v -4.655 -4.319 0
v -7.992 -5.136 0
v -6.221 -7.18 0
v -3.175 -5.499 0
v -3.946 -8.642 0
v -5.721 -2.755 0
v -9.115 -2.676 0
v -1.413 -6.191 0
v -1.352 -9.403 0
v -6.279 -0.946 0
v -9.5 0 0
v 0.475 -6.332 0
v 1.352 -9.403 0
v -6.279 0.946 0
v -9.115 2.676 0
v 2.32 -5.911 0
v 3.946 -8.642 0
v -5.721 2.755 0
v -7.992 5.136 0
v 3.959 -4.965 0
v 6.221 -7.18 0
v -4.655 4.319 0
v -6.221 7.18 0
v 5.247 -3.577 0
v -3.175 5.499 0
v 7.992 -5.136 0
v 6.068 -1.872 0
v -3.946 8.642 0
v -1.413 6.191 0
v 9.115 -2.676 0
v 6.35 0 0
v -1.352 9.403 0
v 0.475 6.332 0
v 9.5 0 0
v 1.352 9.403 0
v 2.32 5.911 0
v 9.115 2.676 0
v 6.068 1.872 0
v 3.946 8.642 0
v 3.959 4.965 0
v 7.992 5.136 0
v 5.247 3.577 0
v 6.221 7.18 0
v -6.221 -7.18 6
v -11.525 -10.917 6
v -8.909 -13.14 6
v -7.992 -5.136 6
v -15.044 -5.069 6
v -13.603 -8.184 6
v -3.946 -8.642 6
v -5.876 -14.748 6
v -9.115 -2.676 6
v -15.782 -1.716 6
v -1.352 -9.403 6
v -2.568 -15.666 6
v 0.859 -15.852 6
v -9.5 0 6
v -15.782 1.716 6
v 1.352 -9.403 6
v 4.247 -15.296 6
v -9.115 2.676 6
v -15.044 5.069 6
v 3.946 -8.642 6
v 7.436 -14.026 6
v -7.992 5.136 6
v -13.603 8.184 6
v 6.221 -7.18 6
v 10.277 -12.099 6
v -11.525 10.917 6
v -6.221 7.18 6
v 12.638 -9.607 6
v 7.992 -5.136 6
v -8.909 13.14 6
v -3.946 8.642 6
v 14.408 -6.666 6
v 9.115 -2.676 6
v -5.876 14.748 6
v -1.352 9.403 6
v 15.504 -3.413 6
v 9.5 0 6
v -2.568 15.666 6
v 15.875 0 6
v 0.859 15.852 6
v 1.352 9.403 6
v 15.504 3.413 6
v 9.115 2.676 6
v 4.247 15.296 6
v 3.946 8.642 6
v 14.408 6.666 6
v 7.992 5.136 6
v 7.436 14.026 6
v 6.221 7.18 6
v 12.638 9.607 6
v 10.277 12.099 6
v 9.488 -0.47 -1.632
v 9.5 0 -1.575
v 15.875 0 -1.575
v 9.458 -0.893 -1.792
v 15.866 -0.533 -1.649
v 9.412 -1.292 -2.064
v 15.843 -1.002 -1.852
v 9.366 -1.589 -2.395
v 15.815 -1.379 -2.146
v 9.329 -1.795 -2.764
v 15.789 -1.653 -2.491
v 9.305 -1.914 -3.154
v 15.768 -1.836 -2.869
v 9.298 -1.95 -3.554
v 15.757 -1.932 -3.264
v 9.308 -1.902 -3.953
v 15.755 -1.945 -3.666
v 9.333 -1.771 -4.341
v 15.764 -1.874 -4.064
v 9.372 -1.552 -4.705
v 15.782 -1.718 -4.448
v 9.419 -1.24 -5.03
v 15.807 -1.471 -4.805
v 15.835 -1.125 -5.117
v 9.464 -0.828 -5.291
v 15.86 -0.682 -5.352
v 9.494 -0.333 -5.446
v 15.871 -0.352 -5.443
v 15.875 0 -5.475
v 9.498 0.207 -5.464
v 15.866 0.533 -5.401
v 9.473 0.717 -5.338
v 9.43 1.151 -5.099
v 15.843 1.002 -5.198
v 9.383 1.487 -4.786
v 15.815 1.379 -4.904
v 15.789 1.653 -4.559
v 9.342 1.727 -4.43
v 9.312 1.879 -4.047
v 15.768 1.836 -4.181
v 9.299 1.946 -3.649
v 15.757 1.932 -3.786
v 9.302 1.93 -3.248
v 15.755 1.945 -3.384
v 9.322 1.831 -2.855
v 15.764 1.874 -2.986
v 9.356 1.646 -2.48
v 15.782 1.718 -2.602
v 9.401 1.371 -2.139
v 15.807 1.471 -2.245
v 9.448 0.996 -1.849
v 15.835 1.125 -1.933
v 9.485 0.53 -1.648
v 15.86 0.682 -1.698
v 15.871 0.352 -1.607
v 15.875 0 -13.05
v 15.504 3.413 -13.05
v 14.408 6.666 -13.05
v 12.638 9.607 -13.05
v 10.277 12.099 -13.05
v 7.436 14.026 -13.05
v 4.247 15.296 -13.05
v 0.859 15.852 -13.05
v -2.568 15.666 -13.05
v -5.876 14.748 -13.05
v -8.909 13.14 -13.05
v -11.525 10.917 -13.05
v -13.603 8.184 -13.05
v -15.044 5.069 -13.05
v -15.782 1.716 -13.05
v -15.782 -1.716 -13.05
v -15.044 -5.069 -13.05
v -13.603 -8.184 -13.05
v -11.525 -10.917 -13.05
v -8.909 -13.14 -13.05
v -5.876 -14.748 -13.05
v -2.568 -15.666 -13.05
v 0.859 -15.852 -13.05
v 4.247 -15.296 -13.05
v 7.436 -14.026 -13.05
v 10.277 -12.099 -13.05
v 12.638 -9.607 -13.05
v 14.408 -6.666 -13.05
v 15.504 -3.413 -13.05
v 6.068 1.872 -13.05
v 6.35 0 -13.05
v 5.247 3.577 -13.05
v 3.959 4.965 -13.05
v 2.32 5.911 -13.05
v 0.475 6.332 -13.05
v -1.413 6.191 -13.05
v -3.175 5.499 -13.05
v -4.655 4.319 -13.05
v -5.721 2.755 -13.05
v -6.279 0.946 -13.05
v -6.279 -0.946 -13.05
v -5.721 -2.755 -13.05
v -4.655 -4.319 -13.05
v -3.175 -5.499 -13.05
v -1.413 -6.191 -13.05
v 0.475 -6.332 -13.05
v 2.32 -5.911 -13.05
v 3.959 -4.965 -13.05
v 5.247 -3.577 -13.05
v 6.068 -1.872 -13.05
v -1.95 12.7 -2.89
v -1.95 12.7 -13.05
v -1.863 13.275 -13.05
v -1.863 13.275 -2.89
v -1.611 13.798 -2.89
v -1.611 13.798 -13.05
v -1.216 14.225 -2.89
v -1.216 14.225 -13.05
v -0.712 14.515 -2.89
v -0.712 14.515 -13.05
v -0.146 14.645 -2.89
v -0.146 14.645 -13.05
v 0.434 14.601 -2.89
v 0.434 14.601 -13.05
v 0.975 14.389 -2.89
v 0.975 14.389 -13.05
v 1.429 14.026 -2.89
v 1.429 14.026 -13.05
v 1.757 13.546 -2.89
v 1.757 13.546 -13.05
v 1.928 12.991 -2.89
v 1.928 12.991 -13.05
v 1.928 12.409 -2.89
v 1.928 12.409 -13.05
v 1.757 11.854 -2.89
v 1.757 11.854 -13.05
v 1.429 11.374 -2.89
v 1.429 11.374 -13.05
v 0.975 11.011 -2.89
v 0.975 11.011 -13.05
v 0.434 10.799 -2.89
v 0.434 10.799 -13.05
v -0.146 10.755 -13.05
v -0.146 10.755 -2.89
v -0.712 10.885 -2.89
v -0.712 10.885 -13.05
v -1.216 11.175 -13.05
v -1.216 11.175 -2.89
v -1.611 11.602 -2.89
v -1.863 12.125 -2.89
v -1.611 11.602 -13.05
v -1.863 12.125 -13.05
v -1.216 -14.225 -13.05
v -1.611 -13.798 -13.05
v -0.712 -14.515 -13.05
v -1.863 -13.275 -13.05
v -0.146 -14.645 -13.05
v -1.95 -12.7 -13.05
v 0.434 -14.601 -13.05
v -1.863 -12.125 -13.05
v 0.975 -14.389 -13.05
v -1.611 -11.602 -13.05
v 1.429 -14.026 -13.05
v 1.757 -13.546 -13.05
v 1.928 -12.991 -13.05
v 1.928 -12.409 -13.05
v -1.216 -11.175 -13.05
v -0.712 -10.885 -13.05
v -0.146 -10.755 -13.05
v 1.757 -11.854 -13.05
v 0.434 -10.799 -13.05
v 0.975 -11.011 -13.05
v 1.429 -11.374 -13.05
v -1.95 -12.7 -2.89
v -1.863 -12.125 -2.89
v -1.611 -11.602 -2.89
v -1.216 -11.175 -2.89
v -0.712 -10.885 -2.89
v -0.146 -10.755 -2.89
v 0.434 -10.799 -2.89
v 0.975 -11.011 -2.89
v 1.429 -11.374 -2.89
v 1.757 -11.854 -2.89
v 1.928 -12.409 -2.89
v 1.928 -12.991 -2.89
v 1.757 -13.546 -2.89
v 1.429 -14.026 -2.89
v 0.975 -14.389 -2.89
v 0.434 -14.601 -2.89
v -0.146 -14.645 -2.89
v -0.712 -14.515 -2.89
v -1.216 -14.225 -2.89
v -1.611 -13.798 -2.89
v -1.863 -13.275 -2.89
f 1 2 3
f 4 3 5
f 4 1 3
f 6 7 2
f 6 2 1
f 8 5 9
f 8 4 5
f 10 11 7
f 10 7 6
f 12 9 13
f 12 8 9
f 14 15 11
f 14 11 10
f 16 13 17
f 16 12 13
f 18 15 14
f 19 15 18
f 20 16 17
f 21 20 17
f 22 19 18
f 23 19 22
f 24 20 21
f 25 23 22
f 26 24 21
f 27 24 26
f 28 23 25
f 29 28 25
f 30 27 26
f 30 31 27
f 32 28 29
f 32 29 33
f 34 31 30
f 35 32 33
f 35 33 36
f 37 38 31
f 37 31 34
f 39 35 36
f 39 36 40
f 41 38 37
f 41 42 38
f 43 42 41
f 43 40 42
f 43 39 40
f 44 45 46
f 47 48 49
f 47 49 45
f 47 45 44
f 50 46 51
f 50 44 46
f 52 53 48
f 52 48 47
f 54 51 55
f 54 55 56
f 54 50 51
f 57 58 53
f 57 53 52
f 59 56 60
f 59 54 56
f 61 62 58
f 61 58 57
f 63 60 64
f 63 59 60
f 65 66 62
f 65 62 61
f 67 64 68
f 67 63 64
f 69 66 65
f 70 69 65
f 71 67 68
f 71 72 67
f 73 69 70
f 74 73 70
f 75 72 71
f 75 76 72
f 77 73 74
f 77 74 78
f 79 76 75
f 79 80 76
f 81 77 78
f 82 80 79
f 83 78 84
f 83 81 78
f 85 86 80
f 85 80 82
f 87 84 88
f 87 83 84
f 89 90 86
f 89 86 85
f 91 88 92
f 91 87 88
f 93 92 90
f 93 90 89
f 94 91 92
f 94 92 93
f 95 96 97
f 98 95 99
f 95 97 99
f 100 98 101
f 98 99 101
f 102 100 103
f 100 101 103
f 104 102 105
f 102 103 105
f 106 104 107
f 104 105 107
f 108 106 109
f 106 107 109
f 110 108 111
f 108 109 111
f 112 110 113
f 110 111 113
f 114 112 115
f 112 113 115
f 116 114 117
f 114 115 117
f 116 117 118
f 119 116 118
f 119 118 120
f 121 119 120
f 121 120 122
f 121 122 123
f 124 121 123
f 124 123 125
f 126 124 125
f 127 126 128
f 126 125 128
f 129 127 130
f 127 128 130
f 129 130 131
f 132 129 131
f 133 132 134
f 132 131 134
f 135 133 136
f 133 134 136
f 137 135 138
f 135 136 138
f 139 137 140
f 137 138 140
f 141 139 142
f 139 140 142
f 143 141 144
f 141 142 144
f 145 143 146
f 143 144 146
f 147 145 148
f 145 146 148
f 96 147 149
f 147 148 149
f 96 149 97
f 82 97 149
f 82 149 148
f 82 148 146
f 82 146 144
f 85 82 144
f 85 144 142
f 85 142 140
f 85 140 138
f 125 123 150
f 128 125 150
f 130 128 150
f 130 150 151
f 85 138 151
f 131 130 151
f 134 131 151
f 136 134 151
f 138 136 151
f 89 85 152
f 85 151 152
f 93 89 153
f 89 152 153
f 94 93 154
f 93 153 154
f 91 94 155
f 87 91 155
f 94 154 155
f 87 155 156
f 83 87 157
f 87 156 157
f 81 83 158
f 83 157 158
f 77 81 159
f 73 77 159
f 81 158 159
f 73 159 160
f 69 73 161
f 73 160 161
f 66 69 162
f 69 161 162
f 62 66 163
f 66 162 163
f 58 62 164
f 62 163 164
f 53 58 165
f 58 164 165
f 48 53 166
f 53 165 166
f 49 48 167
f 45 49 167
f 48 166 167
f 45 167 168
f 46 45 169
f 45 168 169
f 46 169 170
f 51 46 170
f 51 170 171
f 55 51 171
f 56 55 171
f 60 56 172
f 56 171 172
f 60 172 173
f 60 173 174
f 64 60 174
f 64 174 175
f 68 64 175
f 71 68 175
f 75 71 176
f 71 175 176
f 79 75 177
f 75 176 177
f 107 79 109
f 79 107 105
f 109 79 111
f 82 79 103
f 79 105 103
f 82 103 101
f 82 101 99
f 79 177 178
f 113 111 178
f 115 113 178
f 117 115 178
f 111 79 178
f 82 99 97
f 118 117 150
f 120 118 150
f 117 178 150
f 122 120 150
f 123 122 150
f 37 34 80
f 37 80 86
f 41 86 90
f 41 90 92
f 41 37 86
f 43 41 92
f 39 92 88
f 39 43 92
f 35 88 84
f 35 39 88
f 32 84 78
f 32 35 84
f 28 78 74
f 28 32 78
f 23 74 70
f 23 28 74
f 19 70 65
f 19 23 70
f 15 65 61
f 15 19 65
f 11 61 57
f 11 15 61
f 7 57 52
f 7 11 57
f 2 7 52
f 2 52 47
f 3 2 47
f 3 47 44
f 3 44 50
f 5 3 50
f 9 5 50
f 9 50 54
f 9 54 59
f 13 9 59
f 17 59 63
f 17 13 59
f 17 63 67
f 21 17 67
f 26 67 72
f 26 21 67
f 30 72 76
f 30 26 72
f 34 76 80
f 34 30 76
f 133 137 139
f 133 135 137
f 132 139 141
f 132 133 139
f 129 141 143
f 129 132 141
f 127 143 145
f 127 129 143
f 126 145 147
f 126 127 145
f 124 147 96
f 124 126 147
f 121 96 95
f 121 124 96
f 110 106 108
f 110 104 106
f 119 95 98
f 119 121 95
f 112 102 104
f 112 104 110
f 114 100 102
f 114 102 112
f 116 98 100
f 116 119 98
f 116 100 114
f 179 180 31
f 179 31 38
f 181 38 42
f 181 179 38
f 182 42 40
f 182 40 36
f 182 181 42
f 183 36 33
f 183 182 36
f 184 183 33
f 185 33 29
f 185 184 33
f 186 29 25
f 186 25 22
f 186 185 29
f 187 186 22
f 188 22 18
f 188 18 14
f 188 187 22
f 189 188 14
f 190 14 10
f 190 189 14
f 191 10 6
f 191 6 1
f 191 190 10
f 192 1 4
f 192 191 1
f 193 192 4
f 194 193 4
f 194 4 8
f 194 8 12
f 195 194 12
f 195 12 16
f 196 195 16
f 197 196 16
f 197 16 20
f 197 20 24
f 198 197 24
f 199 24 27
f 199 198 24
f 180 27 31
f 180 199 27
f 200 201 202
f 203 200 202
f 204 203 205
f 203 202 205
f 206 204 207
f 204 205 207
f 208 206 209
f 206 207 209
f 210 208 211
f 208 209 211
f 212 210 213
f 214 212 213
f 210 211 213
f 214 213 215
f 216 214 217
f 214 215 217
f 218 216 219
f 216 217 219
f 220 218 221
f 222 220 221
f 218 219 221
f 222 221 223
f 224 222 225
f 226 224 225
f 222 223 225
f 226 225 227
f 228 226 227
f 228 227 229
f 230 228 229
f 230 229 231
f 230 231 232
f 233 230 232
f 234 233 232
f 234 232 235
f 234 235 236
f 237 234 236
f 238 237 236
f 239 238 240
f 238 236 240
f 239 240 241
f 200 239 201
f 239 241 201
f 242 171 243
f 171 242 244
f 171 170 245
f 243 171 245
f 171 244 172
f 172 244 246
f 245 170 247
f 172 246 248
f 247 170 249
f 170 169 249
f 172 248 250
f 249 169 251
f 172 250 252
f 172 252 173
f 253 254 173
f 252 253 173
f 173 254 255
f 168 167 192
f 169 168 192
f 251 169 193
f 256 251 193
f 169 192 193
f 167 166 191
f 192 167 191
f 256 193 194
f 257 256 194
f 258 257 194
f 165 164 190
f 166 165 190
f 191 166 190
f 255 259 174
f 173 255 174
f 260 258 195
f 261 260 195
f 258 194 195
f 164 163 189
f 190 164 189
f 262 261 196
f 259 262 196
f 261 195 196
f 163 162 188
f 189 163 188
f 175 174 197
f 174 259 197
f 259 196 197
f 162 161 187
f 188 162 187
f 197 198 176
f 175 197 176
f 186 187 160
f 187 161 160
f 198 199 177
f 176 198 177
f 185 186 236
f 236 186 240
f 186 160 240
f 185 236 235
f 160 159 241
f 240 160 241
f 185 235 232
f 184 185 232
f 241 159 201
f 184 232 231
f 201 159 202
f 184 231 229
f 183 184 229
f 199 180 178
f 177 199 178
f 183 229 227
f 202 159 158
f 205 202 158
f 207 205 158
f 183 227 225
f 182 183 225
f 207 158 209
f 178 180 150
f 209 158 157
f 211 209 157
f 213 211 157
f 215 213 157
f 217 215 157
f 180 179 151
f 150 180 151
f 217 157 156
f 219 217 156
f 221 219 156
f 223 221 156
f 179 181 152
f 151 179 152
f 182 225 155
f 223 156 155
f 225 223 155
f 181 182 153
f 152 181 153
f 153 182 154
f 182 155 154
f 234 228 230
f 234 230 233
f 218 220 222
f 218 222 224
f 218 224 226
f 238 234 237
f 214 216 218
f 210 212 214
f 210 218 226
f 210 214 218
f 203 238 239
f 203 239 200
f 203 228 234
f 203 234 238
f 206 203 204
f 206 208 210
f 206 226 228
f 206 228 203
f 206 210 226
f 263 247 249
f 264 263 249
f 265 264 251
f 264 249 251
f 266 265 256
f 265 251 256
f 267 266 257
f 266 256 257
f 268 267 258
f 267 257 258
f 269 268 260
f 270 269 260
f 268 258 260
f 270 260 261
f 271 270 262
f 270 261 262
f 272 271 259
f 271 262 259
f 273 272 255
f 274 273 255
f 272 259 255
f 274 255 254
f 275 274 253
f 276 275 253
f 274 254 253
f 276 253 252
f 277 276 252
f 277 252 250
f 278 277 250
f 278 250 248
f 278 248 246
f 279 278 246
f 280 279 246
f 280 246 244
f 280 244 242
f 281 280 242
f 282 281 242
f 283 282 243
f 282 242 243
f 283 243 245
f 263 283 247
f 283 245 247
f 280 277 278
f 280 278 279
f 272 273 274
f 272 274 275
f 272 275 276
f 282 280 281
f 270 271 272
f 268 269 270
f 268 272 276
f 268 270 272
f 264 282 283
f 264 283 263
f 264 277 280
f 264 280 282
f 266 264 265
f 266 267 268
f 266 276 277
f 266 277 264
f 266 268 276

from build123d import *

# Parameters (mm, degrees)
SKETCH1_R               = 15.875
SKETCH1_R_2             = 9.5
BOSS_EXTRUDE1_DEPTH     = 6
BOSS_EXTRUDE2_START     = -13.050000062
SKETCH1_3_R             = 15.875
SKETCH1_3_R_2           = 9.5
SKETCH1_3_R_3           = 6.35
BOSS_EXTRUDE2_DEPTH     = 13.050000062
SKETCH3_R               = 1.95
CUT_EXTRUDE1_DEPTH      = 10.16
CUT_EXTRUDE2_REACH      = 39.82
CUT_EXTRUDE2_END_RADIUS = 9.5


with BuildPart() as part:
    # Sketch1 → Boss-Extrude1 (new body)
    with BuildSketch(Plane.XY):
        Circle(SKETCH1_R)
        Circle(SKETCH1_R_2, mode=Mode.SUBTRACT)
    extrude(amount=BOSS_EXTRUDE1_DEPTH)

    # Sketch1<3> → Boss-Extrude2 (add)
    # profile 1 of 2: a face of its own
    with BuildSketch(Plane.XY.offset(BOSS_EXTRUDE2_START)):
        Circle(SKETCH1_3_R)
        Circle(SKETCH1_3_R_2, mode=Mode.SUBTRACT)
    # profile 2 of 2: a face of its own
    with BuildSketch(Plane.XY.offset(BOSS_EXTRUDE2_START)):
        Circle(SKETCH1_3_R_2)
        Circle(SKETCH1_3_R_3, mode=Mode.SUBTRACT)
    extrude(amount=BOSS_EXTRUDE2_DEPTH)

    # Sketch3 → Cut-Extrude1 (cut)
    with BuildSketch(Plane(origin=(0, 0, -13.050000062), x_dir=(-1, 0, 0), z_dir=(0, 0, -1))):
        with Locations((0, 12.7)):
            Circle(SKETCH3_R)
        with Locations((0, -12.7)):
            Circle(SKETCH3_R)
    extrude(amount=-CUT_EXTRUDE1_DEPTH, mode=Mode.SUBTRACT)

    # Cut-Extrude2: up to this cylinder (the profile starts outside it)
    cut_extrude2_end = Plane(origin=(0, 0, -3.525), z_dir=(0, 0, -1)) * Cylinder(CUT_EXTRUDE2_END_RADIUS, 99.64, mode=Mode.PRIVATE)
    # Sketch4 → Cut-Extrude2 (cut, up to the surface)
    with BuildSketch(Plane(origin=(15.875, 0, 0), x_dir=(0, 0, -1), z_dir=(1, 0, 0)), mode=Mode.PRIVATE) as cut_extrude2_sk1:
        with BuildLine():
            ThreePointArc((5.475000031, 0), (3.525000031, 1.95), (1.575000031, 0))
            Line((1.575000031, 0), (5.475000031, 0))
        make_face()
    cut_extrude2_tool1 = extrude(cut_extrude2_sk1.sketch, amount=-CUT_EXTRUDE2_REACH, mode=Mode.PRIVATE) - cut_extrude2_end
    add(cut_extrude2_tool1.solids().sort_by_distance((15.875, 0.827606, -3.525))[0], mode=Mode.SUBTRACT)
    # Sketch4 → Cut-Extrude2 (cut, up to the surface)
    with BuildSketch(Plane(origin=(15.875, 0, 0), x_dir=(0, 0, -1), z_dir=(1, 0, 0)), mode=Mode.PRIVATE) as cut_extrude2_sk2:
        with BuildLine():
            Line((5.475000031, 0), (1.575000031, 0))
            ThreePointArc((1.575000031, 0), (3.525000031, -1.95), (5.475000031, 0))
        make_face()
    cut_extrude2_tool2 = extrude(cut_extrude2_sk2.sketch, amount=-CUT_EXTRUDE2_REACH, mode=Mode.PRIVATE) - cut_extrude2_end
    add(cut_extrude2_tool2.solids().sort_by_distance((15.875, -0.827606, -3.525))[0], mode=Mode.SUBTRACT)
    # Sketch4 → Cut-Extrude2 (cut, up to the surface)
    with BuildSketch(Plane(origin=(15.875, 0, 0), x_dir=(0, 0, -1), z_dir=(1, 0, 0)), mode=Mode.PRIVATE) as cut_extrude2_sk3:
        with BuildLine():
            ThreePointArc((5.475000031, 0), (3.525000031, 1.95), (1.575000031, 0))
            Line((1.575000031, 0), (5.475000031, 0))
        make_face()
    cut_extrude2_tool3 = extrude(cut_extrude2_sk3.sketch, amount=-CUT_EXTRUDE2_REACH, mode=Mode.PRIVATE) - cut_extrude2_end
    add(cut_extrude2_tool3.solids().sort_by_distance((15.875, 0.827606, -3.525))[0], mode=Mode.SUBTRACT)
    # Sketch4 → Cut-Extrude2 (cut, up to the surface)
    with BuildSketch(Plane(origin=(15.875, 0, 0), x_dir=(0, 0, -1), z_dir=(1, 0, 0)), mode=Mode.PRIVATE) as cut_extrude2_sk4:
        with BuildLine():
            Line((5.475000031, 0), (1.575000031, 0))
            ThreePointArc((1.575000031, 0), (3.525000031, -1.95), (5.475000031, 0))
        make_face()
    cut_extrude2_tool4 = extrude(cut_extrude2_sk4.sketch, amount=-CUT_EXTRUDE2_REACH, mode=Mode.PRIVATE) - cut_extrude2_end
    add(cut_extrude2_tool4.solids().sort_by_distance((15.875, -0.827606, -3.525))[0], mode=Mode.SUBTRACT)


solid = part.part
